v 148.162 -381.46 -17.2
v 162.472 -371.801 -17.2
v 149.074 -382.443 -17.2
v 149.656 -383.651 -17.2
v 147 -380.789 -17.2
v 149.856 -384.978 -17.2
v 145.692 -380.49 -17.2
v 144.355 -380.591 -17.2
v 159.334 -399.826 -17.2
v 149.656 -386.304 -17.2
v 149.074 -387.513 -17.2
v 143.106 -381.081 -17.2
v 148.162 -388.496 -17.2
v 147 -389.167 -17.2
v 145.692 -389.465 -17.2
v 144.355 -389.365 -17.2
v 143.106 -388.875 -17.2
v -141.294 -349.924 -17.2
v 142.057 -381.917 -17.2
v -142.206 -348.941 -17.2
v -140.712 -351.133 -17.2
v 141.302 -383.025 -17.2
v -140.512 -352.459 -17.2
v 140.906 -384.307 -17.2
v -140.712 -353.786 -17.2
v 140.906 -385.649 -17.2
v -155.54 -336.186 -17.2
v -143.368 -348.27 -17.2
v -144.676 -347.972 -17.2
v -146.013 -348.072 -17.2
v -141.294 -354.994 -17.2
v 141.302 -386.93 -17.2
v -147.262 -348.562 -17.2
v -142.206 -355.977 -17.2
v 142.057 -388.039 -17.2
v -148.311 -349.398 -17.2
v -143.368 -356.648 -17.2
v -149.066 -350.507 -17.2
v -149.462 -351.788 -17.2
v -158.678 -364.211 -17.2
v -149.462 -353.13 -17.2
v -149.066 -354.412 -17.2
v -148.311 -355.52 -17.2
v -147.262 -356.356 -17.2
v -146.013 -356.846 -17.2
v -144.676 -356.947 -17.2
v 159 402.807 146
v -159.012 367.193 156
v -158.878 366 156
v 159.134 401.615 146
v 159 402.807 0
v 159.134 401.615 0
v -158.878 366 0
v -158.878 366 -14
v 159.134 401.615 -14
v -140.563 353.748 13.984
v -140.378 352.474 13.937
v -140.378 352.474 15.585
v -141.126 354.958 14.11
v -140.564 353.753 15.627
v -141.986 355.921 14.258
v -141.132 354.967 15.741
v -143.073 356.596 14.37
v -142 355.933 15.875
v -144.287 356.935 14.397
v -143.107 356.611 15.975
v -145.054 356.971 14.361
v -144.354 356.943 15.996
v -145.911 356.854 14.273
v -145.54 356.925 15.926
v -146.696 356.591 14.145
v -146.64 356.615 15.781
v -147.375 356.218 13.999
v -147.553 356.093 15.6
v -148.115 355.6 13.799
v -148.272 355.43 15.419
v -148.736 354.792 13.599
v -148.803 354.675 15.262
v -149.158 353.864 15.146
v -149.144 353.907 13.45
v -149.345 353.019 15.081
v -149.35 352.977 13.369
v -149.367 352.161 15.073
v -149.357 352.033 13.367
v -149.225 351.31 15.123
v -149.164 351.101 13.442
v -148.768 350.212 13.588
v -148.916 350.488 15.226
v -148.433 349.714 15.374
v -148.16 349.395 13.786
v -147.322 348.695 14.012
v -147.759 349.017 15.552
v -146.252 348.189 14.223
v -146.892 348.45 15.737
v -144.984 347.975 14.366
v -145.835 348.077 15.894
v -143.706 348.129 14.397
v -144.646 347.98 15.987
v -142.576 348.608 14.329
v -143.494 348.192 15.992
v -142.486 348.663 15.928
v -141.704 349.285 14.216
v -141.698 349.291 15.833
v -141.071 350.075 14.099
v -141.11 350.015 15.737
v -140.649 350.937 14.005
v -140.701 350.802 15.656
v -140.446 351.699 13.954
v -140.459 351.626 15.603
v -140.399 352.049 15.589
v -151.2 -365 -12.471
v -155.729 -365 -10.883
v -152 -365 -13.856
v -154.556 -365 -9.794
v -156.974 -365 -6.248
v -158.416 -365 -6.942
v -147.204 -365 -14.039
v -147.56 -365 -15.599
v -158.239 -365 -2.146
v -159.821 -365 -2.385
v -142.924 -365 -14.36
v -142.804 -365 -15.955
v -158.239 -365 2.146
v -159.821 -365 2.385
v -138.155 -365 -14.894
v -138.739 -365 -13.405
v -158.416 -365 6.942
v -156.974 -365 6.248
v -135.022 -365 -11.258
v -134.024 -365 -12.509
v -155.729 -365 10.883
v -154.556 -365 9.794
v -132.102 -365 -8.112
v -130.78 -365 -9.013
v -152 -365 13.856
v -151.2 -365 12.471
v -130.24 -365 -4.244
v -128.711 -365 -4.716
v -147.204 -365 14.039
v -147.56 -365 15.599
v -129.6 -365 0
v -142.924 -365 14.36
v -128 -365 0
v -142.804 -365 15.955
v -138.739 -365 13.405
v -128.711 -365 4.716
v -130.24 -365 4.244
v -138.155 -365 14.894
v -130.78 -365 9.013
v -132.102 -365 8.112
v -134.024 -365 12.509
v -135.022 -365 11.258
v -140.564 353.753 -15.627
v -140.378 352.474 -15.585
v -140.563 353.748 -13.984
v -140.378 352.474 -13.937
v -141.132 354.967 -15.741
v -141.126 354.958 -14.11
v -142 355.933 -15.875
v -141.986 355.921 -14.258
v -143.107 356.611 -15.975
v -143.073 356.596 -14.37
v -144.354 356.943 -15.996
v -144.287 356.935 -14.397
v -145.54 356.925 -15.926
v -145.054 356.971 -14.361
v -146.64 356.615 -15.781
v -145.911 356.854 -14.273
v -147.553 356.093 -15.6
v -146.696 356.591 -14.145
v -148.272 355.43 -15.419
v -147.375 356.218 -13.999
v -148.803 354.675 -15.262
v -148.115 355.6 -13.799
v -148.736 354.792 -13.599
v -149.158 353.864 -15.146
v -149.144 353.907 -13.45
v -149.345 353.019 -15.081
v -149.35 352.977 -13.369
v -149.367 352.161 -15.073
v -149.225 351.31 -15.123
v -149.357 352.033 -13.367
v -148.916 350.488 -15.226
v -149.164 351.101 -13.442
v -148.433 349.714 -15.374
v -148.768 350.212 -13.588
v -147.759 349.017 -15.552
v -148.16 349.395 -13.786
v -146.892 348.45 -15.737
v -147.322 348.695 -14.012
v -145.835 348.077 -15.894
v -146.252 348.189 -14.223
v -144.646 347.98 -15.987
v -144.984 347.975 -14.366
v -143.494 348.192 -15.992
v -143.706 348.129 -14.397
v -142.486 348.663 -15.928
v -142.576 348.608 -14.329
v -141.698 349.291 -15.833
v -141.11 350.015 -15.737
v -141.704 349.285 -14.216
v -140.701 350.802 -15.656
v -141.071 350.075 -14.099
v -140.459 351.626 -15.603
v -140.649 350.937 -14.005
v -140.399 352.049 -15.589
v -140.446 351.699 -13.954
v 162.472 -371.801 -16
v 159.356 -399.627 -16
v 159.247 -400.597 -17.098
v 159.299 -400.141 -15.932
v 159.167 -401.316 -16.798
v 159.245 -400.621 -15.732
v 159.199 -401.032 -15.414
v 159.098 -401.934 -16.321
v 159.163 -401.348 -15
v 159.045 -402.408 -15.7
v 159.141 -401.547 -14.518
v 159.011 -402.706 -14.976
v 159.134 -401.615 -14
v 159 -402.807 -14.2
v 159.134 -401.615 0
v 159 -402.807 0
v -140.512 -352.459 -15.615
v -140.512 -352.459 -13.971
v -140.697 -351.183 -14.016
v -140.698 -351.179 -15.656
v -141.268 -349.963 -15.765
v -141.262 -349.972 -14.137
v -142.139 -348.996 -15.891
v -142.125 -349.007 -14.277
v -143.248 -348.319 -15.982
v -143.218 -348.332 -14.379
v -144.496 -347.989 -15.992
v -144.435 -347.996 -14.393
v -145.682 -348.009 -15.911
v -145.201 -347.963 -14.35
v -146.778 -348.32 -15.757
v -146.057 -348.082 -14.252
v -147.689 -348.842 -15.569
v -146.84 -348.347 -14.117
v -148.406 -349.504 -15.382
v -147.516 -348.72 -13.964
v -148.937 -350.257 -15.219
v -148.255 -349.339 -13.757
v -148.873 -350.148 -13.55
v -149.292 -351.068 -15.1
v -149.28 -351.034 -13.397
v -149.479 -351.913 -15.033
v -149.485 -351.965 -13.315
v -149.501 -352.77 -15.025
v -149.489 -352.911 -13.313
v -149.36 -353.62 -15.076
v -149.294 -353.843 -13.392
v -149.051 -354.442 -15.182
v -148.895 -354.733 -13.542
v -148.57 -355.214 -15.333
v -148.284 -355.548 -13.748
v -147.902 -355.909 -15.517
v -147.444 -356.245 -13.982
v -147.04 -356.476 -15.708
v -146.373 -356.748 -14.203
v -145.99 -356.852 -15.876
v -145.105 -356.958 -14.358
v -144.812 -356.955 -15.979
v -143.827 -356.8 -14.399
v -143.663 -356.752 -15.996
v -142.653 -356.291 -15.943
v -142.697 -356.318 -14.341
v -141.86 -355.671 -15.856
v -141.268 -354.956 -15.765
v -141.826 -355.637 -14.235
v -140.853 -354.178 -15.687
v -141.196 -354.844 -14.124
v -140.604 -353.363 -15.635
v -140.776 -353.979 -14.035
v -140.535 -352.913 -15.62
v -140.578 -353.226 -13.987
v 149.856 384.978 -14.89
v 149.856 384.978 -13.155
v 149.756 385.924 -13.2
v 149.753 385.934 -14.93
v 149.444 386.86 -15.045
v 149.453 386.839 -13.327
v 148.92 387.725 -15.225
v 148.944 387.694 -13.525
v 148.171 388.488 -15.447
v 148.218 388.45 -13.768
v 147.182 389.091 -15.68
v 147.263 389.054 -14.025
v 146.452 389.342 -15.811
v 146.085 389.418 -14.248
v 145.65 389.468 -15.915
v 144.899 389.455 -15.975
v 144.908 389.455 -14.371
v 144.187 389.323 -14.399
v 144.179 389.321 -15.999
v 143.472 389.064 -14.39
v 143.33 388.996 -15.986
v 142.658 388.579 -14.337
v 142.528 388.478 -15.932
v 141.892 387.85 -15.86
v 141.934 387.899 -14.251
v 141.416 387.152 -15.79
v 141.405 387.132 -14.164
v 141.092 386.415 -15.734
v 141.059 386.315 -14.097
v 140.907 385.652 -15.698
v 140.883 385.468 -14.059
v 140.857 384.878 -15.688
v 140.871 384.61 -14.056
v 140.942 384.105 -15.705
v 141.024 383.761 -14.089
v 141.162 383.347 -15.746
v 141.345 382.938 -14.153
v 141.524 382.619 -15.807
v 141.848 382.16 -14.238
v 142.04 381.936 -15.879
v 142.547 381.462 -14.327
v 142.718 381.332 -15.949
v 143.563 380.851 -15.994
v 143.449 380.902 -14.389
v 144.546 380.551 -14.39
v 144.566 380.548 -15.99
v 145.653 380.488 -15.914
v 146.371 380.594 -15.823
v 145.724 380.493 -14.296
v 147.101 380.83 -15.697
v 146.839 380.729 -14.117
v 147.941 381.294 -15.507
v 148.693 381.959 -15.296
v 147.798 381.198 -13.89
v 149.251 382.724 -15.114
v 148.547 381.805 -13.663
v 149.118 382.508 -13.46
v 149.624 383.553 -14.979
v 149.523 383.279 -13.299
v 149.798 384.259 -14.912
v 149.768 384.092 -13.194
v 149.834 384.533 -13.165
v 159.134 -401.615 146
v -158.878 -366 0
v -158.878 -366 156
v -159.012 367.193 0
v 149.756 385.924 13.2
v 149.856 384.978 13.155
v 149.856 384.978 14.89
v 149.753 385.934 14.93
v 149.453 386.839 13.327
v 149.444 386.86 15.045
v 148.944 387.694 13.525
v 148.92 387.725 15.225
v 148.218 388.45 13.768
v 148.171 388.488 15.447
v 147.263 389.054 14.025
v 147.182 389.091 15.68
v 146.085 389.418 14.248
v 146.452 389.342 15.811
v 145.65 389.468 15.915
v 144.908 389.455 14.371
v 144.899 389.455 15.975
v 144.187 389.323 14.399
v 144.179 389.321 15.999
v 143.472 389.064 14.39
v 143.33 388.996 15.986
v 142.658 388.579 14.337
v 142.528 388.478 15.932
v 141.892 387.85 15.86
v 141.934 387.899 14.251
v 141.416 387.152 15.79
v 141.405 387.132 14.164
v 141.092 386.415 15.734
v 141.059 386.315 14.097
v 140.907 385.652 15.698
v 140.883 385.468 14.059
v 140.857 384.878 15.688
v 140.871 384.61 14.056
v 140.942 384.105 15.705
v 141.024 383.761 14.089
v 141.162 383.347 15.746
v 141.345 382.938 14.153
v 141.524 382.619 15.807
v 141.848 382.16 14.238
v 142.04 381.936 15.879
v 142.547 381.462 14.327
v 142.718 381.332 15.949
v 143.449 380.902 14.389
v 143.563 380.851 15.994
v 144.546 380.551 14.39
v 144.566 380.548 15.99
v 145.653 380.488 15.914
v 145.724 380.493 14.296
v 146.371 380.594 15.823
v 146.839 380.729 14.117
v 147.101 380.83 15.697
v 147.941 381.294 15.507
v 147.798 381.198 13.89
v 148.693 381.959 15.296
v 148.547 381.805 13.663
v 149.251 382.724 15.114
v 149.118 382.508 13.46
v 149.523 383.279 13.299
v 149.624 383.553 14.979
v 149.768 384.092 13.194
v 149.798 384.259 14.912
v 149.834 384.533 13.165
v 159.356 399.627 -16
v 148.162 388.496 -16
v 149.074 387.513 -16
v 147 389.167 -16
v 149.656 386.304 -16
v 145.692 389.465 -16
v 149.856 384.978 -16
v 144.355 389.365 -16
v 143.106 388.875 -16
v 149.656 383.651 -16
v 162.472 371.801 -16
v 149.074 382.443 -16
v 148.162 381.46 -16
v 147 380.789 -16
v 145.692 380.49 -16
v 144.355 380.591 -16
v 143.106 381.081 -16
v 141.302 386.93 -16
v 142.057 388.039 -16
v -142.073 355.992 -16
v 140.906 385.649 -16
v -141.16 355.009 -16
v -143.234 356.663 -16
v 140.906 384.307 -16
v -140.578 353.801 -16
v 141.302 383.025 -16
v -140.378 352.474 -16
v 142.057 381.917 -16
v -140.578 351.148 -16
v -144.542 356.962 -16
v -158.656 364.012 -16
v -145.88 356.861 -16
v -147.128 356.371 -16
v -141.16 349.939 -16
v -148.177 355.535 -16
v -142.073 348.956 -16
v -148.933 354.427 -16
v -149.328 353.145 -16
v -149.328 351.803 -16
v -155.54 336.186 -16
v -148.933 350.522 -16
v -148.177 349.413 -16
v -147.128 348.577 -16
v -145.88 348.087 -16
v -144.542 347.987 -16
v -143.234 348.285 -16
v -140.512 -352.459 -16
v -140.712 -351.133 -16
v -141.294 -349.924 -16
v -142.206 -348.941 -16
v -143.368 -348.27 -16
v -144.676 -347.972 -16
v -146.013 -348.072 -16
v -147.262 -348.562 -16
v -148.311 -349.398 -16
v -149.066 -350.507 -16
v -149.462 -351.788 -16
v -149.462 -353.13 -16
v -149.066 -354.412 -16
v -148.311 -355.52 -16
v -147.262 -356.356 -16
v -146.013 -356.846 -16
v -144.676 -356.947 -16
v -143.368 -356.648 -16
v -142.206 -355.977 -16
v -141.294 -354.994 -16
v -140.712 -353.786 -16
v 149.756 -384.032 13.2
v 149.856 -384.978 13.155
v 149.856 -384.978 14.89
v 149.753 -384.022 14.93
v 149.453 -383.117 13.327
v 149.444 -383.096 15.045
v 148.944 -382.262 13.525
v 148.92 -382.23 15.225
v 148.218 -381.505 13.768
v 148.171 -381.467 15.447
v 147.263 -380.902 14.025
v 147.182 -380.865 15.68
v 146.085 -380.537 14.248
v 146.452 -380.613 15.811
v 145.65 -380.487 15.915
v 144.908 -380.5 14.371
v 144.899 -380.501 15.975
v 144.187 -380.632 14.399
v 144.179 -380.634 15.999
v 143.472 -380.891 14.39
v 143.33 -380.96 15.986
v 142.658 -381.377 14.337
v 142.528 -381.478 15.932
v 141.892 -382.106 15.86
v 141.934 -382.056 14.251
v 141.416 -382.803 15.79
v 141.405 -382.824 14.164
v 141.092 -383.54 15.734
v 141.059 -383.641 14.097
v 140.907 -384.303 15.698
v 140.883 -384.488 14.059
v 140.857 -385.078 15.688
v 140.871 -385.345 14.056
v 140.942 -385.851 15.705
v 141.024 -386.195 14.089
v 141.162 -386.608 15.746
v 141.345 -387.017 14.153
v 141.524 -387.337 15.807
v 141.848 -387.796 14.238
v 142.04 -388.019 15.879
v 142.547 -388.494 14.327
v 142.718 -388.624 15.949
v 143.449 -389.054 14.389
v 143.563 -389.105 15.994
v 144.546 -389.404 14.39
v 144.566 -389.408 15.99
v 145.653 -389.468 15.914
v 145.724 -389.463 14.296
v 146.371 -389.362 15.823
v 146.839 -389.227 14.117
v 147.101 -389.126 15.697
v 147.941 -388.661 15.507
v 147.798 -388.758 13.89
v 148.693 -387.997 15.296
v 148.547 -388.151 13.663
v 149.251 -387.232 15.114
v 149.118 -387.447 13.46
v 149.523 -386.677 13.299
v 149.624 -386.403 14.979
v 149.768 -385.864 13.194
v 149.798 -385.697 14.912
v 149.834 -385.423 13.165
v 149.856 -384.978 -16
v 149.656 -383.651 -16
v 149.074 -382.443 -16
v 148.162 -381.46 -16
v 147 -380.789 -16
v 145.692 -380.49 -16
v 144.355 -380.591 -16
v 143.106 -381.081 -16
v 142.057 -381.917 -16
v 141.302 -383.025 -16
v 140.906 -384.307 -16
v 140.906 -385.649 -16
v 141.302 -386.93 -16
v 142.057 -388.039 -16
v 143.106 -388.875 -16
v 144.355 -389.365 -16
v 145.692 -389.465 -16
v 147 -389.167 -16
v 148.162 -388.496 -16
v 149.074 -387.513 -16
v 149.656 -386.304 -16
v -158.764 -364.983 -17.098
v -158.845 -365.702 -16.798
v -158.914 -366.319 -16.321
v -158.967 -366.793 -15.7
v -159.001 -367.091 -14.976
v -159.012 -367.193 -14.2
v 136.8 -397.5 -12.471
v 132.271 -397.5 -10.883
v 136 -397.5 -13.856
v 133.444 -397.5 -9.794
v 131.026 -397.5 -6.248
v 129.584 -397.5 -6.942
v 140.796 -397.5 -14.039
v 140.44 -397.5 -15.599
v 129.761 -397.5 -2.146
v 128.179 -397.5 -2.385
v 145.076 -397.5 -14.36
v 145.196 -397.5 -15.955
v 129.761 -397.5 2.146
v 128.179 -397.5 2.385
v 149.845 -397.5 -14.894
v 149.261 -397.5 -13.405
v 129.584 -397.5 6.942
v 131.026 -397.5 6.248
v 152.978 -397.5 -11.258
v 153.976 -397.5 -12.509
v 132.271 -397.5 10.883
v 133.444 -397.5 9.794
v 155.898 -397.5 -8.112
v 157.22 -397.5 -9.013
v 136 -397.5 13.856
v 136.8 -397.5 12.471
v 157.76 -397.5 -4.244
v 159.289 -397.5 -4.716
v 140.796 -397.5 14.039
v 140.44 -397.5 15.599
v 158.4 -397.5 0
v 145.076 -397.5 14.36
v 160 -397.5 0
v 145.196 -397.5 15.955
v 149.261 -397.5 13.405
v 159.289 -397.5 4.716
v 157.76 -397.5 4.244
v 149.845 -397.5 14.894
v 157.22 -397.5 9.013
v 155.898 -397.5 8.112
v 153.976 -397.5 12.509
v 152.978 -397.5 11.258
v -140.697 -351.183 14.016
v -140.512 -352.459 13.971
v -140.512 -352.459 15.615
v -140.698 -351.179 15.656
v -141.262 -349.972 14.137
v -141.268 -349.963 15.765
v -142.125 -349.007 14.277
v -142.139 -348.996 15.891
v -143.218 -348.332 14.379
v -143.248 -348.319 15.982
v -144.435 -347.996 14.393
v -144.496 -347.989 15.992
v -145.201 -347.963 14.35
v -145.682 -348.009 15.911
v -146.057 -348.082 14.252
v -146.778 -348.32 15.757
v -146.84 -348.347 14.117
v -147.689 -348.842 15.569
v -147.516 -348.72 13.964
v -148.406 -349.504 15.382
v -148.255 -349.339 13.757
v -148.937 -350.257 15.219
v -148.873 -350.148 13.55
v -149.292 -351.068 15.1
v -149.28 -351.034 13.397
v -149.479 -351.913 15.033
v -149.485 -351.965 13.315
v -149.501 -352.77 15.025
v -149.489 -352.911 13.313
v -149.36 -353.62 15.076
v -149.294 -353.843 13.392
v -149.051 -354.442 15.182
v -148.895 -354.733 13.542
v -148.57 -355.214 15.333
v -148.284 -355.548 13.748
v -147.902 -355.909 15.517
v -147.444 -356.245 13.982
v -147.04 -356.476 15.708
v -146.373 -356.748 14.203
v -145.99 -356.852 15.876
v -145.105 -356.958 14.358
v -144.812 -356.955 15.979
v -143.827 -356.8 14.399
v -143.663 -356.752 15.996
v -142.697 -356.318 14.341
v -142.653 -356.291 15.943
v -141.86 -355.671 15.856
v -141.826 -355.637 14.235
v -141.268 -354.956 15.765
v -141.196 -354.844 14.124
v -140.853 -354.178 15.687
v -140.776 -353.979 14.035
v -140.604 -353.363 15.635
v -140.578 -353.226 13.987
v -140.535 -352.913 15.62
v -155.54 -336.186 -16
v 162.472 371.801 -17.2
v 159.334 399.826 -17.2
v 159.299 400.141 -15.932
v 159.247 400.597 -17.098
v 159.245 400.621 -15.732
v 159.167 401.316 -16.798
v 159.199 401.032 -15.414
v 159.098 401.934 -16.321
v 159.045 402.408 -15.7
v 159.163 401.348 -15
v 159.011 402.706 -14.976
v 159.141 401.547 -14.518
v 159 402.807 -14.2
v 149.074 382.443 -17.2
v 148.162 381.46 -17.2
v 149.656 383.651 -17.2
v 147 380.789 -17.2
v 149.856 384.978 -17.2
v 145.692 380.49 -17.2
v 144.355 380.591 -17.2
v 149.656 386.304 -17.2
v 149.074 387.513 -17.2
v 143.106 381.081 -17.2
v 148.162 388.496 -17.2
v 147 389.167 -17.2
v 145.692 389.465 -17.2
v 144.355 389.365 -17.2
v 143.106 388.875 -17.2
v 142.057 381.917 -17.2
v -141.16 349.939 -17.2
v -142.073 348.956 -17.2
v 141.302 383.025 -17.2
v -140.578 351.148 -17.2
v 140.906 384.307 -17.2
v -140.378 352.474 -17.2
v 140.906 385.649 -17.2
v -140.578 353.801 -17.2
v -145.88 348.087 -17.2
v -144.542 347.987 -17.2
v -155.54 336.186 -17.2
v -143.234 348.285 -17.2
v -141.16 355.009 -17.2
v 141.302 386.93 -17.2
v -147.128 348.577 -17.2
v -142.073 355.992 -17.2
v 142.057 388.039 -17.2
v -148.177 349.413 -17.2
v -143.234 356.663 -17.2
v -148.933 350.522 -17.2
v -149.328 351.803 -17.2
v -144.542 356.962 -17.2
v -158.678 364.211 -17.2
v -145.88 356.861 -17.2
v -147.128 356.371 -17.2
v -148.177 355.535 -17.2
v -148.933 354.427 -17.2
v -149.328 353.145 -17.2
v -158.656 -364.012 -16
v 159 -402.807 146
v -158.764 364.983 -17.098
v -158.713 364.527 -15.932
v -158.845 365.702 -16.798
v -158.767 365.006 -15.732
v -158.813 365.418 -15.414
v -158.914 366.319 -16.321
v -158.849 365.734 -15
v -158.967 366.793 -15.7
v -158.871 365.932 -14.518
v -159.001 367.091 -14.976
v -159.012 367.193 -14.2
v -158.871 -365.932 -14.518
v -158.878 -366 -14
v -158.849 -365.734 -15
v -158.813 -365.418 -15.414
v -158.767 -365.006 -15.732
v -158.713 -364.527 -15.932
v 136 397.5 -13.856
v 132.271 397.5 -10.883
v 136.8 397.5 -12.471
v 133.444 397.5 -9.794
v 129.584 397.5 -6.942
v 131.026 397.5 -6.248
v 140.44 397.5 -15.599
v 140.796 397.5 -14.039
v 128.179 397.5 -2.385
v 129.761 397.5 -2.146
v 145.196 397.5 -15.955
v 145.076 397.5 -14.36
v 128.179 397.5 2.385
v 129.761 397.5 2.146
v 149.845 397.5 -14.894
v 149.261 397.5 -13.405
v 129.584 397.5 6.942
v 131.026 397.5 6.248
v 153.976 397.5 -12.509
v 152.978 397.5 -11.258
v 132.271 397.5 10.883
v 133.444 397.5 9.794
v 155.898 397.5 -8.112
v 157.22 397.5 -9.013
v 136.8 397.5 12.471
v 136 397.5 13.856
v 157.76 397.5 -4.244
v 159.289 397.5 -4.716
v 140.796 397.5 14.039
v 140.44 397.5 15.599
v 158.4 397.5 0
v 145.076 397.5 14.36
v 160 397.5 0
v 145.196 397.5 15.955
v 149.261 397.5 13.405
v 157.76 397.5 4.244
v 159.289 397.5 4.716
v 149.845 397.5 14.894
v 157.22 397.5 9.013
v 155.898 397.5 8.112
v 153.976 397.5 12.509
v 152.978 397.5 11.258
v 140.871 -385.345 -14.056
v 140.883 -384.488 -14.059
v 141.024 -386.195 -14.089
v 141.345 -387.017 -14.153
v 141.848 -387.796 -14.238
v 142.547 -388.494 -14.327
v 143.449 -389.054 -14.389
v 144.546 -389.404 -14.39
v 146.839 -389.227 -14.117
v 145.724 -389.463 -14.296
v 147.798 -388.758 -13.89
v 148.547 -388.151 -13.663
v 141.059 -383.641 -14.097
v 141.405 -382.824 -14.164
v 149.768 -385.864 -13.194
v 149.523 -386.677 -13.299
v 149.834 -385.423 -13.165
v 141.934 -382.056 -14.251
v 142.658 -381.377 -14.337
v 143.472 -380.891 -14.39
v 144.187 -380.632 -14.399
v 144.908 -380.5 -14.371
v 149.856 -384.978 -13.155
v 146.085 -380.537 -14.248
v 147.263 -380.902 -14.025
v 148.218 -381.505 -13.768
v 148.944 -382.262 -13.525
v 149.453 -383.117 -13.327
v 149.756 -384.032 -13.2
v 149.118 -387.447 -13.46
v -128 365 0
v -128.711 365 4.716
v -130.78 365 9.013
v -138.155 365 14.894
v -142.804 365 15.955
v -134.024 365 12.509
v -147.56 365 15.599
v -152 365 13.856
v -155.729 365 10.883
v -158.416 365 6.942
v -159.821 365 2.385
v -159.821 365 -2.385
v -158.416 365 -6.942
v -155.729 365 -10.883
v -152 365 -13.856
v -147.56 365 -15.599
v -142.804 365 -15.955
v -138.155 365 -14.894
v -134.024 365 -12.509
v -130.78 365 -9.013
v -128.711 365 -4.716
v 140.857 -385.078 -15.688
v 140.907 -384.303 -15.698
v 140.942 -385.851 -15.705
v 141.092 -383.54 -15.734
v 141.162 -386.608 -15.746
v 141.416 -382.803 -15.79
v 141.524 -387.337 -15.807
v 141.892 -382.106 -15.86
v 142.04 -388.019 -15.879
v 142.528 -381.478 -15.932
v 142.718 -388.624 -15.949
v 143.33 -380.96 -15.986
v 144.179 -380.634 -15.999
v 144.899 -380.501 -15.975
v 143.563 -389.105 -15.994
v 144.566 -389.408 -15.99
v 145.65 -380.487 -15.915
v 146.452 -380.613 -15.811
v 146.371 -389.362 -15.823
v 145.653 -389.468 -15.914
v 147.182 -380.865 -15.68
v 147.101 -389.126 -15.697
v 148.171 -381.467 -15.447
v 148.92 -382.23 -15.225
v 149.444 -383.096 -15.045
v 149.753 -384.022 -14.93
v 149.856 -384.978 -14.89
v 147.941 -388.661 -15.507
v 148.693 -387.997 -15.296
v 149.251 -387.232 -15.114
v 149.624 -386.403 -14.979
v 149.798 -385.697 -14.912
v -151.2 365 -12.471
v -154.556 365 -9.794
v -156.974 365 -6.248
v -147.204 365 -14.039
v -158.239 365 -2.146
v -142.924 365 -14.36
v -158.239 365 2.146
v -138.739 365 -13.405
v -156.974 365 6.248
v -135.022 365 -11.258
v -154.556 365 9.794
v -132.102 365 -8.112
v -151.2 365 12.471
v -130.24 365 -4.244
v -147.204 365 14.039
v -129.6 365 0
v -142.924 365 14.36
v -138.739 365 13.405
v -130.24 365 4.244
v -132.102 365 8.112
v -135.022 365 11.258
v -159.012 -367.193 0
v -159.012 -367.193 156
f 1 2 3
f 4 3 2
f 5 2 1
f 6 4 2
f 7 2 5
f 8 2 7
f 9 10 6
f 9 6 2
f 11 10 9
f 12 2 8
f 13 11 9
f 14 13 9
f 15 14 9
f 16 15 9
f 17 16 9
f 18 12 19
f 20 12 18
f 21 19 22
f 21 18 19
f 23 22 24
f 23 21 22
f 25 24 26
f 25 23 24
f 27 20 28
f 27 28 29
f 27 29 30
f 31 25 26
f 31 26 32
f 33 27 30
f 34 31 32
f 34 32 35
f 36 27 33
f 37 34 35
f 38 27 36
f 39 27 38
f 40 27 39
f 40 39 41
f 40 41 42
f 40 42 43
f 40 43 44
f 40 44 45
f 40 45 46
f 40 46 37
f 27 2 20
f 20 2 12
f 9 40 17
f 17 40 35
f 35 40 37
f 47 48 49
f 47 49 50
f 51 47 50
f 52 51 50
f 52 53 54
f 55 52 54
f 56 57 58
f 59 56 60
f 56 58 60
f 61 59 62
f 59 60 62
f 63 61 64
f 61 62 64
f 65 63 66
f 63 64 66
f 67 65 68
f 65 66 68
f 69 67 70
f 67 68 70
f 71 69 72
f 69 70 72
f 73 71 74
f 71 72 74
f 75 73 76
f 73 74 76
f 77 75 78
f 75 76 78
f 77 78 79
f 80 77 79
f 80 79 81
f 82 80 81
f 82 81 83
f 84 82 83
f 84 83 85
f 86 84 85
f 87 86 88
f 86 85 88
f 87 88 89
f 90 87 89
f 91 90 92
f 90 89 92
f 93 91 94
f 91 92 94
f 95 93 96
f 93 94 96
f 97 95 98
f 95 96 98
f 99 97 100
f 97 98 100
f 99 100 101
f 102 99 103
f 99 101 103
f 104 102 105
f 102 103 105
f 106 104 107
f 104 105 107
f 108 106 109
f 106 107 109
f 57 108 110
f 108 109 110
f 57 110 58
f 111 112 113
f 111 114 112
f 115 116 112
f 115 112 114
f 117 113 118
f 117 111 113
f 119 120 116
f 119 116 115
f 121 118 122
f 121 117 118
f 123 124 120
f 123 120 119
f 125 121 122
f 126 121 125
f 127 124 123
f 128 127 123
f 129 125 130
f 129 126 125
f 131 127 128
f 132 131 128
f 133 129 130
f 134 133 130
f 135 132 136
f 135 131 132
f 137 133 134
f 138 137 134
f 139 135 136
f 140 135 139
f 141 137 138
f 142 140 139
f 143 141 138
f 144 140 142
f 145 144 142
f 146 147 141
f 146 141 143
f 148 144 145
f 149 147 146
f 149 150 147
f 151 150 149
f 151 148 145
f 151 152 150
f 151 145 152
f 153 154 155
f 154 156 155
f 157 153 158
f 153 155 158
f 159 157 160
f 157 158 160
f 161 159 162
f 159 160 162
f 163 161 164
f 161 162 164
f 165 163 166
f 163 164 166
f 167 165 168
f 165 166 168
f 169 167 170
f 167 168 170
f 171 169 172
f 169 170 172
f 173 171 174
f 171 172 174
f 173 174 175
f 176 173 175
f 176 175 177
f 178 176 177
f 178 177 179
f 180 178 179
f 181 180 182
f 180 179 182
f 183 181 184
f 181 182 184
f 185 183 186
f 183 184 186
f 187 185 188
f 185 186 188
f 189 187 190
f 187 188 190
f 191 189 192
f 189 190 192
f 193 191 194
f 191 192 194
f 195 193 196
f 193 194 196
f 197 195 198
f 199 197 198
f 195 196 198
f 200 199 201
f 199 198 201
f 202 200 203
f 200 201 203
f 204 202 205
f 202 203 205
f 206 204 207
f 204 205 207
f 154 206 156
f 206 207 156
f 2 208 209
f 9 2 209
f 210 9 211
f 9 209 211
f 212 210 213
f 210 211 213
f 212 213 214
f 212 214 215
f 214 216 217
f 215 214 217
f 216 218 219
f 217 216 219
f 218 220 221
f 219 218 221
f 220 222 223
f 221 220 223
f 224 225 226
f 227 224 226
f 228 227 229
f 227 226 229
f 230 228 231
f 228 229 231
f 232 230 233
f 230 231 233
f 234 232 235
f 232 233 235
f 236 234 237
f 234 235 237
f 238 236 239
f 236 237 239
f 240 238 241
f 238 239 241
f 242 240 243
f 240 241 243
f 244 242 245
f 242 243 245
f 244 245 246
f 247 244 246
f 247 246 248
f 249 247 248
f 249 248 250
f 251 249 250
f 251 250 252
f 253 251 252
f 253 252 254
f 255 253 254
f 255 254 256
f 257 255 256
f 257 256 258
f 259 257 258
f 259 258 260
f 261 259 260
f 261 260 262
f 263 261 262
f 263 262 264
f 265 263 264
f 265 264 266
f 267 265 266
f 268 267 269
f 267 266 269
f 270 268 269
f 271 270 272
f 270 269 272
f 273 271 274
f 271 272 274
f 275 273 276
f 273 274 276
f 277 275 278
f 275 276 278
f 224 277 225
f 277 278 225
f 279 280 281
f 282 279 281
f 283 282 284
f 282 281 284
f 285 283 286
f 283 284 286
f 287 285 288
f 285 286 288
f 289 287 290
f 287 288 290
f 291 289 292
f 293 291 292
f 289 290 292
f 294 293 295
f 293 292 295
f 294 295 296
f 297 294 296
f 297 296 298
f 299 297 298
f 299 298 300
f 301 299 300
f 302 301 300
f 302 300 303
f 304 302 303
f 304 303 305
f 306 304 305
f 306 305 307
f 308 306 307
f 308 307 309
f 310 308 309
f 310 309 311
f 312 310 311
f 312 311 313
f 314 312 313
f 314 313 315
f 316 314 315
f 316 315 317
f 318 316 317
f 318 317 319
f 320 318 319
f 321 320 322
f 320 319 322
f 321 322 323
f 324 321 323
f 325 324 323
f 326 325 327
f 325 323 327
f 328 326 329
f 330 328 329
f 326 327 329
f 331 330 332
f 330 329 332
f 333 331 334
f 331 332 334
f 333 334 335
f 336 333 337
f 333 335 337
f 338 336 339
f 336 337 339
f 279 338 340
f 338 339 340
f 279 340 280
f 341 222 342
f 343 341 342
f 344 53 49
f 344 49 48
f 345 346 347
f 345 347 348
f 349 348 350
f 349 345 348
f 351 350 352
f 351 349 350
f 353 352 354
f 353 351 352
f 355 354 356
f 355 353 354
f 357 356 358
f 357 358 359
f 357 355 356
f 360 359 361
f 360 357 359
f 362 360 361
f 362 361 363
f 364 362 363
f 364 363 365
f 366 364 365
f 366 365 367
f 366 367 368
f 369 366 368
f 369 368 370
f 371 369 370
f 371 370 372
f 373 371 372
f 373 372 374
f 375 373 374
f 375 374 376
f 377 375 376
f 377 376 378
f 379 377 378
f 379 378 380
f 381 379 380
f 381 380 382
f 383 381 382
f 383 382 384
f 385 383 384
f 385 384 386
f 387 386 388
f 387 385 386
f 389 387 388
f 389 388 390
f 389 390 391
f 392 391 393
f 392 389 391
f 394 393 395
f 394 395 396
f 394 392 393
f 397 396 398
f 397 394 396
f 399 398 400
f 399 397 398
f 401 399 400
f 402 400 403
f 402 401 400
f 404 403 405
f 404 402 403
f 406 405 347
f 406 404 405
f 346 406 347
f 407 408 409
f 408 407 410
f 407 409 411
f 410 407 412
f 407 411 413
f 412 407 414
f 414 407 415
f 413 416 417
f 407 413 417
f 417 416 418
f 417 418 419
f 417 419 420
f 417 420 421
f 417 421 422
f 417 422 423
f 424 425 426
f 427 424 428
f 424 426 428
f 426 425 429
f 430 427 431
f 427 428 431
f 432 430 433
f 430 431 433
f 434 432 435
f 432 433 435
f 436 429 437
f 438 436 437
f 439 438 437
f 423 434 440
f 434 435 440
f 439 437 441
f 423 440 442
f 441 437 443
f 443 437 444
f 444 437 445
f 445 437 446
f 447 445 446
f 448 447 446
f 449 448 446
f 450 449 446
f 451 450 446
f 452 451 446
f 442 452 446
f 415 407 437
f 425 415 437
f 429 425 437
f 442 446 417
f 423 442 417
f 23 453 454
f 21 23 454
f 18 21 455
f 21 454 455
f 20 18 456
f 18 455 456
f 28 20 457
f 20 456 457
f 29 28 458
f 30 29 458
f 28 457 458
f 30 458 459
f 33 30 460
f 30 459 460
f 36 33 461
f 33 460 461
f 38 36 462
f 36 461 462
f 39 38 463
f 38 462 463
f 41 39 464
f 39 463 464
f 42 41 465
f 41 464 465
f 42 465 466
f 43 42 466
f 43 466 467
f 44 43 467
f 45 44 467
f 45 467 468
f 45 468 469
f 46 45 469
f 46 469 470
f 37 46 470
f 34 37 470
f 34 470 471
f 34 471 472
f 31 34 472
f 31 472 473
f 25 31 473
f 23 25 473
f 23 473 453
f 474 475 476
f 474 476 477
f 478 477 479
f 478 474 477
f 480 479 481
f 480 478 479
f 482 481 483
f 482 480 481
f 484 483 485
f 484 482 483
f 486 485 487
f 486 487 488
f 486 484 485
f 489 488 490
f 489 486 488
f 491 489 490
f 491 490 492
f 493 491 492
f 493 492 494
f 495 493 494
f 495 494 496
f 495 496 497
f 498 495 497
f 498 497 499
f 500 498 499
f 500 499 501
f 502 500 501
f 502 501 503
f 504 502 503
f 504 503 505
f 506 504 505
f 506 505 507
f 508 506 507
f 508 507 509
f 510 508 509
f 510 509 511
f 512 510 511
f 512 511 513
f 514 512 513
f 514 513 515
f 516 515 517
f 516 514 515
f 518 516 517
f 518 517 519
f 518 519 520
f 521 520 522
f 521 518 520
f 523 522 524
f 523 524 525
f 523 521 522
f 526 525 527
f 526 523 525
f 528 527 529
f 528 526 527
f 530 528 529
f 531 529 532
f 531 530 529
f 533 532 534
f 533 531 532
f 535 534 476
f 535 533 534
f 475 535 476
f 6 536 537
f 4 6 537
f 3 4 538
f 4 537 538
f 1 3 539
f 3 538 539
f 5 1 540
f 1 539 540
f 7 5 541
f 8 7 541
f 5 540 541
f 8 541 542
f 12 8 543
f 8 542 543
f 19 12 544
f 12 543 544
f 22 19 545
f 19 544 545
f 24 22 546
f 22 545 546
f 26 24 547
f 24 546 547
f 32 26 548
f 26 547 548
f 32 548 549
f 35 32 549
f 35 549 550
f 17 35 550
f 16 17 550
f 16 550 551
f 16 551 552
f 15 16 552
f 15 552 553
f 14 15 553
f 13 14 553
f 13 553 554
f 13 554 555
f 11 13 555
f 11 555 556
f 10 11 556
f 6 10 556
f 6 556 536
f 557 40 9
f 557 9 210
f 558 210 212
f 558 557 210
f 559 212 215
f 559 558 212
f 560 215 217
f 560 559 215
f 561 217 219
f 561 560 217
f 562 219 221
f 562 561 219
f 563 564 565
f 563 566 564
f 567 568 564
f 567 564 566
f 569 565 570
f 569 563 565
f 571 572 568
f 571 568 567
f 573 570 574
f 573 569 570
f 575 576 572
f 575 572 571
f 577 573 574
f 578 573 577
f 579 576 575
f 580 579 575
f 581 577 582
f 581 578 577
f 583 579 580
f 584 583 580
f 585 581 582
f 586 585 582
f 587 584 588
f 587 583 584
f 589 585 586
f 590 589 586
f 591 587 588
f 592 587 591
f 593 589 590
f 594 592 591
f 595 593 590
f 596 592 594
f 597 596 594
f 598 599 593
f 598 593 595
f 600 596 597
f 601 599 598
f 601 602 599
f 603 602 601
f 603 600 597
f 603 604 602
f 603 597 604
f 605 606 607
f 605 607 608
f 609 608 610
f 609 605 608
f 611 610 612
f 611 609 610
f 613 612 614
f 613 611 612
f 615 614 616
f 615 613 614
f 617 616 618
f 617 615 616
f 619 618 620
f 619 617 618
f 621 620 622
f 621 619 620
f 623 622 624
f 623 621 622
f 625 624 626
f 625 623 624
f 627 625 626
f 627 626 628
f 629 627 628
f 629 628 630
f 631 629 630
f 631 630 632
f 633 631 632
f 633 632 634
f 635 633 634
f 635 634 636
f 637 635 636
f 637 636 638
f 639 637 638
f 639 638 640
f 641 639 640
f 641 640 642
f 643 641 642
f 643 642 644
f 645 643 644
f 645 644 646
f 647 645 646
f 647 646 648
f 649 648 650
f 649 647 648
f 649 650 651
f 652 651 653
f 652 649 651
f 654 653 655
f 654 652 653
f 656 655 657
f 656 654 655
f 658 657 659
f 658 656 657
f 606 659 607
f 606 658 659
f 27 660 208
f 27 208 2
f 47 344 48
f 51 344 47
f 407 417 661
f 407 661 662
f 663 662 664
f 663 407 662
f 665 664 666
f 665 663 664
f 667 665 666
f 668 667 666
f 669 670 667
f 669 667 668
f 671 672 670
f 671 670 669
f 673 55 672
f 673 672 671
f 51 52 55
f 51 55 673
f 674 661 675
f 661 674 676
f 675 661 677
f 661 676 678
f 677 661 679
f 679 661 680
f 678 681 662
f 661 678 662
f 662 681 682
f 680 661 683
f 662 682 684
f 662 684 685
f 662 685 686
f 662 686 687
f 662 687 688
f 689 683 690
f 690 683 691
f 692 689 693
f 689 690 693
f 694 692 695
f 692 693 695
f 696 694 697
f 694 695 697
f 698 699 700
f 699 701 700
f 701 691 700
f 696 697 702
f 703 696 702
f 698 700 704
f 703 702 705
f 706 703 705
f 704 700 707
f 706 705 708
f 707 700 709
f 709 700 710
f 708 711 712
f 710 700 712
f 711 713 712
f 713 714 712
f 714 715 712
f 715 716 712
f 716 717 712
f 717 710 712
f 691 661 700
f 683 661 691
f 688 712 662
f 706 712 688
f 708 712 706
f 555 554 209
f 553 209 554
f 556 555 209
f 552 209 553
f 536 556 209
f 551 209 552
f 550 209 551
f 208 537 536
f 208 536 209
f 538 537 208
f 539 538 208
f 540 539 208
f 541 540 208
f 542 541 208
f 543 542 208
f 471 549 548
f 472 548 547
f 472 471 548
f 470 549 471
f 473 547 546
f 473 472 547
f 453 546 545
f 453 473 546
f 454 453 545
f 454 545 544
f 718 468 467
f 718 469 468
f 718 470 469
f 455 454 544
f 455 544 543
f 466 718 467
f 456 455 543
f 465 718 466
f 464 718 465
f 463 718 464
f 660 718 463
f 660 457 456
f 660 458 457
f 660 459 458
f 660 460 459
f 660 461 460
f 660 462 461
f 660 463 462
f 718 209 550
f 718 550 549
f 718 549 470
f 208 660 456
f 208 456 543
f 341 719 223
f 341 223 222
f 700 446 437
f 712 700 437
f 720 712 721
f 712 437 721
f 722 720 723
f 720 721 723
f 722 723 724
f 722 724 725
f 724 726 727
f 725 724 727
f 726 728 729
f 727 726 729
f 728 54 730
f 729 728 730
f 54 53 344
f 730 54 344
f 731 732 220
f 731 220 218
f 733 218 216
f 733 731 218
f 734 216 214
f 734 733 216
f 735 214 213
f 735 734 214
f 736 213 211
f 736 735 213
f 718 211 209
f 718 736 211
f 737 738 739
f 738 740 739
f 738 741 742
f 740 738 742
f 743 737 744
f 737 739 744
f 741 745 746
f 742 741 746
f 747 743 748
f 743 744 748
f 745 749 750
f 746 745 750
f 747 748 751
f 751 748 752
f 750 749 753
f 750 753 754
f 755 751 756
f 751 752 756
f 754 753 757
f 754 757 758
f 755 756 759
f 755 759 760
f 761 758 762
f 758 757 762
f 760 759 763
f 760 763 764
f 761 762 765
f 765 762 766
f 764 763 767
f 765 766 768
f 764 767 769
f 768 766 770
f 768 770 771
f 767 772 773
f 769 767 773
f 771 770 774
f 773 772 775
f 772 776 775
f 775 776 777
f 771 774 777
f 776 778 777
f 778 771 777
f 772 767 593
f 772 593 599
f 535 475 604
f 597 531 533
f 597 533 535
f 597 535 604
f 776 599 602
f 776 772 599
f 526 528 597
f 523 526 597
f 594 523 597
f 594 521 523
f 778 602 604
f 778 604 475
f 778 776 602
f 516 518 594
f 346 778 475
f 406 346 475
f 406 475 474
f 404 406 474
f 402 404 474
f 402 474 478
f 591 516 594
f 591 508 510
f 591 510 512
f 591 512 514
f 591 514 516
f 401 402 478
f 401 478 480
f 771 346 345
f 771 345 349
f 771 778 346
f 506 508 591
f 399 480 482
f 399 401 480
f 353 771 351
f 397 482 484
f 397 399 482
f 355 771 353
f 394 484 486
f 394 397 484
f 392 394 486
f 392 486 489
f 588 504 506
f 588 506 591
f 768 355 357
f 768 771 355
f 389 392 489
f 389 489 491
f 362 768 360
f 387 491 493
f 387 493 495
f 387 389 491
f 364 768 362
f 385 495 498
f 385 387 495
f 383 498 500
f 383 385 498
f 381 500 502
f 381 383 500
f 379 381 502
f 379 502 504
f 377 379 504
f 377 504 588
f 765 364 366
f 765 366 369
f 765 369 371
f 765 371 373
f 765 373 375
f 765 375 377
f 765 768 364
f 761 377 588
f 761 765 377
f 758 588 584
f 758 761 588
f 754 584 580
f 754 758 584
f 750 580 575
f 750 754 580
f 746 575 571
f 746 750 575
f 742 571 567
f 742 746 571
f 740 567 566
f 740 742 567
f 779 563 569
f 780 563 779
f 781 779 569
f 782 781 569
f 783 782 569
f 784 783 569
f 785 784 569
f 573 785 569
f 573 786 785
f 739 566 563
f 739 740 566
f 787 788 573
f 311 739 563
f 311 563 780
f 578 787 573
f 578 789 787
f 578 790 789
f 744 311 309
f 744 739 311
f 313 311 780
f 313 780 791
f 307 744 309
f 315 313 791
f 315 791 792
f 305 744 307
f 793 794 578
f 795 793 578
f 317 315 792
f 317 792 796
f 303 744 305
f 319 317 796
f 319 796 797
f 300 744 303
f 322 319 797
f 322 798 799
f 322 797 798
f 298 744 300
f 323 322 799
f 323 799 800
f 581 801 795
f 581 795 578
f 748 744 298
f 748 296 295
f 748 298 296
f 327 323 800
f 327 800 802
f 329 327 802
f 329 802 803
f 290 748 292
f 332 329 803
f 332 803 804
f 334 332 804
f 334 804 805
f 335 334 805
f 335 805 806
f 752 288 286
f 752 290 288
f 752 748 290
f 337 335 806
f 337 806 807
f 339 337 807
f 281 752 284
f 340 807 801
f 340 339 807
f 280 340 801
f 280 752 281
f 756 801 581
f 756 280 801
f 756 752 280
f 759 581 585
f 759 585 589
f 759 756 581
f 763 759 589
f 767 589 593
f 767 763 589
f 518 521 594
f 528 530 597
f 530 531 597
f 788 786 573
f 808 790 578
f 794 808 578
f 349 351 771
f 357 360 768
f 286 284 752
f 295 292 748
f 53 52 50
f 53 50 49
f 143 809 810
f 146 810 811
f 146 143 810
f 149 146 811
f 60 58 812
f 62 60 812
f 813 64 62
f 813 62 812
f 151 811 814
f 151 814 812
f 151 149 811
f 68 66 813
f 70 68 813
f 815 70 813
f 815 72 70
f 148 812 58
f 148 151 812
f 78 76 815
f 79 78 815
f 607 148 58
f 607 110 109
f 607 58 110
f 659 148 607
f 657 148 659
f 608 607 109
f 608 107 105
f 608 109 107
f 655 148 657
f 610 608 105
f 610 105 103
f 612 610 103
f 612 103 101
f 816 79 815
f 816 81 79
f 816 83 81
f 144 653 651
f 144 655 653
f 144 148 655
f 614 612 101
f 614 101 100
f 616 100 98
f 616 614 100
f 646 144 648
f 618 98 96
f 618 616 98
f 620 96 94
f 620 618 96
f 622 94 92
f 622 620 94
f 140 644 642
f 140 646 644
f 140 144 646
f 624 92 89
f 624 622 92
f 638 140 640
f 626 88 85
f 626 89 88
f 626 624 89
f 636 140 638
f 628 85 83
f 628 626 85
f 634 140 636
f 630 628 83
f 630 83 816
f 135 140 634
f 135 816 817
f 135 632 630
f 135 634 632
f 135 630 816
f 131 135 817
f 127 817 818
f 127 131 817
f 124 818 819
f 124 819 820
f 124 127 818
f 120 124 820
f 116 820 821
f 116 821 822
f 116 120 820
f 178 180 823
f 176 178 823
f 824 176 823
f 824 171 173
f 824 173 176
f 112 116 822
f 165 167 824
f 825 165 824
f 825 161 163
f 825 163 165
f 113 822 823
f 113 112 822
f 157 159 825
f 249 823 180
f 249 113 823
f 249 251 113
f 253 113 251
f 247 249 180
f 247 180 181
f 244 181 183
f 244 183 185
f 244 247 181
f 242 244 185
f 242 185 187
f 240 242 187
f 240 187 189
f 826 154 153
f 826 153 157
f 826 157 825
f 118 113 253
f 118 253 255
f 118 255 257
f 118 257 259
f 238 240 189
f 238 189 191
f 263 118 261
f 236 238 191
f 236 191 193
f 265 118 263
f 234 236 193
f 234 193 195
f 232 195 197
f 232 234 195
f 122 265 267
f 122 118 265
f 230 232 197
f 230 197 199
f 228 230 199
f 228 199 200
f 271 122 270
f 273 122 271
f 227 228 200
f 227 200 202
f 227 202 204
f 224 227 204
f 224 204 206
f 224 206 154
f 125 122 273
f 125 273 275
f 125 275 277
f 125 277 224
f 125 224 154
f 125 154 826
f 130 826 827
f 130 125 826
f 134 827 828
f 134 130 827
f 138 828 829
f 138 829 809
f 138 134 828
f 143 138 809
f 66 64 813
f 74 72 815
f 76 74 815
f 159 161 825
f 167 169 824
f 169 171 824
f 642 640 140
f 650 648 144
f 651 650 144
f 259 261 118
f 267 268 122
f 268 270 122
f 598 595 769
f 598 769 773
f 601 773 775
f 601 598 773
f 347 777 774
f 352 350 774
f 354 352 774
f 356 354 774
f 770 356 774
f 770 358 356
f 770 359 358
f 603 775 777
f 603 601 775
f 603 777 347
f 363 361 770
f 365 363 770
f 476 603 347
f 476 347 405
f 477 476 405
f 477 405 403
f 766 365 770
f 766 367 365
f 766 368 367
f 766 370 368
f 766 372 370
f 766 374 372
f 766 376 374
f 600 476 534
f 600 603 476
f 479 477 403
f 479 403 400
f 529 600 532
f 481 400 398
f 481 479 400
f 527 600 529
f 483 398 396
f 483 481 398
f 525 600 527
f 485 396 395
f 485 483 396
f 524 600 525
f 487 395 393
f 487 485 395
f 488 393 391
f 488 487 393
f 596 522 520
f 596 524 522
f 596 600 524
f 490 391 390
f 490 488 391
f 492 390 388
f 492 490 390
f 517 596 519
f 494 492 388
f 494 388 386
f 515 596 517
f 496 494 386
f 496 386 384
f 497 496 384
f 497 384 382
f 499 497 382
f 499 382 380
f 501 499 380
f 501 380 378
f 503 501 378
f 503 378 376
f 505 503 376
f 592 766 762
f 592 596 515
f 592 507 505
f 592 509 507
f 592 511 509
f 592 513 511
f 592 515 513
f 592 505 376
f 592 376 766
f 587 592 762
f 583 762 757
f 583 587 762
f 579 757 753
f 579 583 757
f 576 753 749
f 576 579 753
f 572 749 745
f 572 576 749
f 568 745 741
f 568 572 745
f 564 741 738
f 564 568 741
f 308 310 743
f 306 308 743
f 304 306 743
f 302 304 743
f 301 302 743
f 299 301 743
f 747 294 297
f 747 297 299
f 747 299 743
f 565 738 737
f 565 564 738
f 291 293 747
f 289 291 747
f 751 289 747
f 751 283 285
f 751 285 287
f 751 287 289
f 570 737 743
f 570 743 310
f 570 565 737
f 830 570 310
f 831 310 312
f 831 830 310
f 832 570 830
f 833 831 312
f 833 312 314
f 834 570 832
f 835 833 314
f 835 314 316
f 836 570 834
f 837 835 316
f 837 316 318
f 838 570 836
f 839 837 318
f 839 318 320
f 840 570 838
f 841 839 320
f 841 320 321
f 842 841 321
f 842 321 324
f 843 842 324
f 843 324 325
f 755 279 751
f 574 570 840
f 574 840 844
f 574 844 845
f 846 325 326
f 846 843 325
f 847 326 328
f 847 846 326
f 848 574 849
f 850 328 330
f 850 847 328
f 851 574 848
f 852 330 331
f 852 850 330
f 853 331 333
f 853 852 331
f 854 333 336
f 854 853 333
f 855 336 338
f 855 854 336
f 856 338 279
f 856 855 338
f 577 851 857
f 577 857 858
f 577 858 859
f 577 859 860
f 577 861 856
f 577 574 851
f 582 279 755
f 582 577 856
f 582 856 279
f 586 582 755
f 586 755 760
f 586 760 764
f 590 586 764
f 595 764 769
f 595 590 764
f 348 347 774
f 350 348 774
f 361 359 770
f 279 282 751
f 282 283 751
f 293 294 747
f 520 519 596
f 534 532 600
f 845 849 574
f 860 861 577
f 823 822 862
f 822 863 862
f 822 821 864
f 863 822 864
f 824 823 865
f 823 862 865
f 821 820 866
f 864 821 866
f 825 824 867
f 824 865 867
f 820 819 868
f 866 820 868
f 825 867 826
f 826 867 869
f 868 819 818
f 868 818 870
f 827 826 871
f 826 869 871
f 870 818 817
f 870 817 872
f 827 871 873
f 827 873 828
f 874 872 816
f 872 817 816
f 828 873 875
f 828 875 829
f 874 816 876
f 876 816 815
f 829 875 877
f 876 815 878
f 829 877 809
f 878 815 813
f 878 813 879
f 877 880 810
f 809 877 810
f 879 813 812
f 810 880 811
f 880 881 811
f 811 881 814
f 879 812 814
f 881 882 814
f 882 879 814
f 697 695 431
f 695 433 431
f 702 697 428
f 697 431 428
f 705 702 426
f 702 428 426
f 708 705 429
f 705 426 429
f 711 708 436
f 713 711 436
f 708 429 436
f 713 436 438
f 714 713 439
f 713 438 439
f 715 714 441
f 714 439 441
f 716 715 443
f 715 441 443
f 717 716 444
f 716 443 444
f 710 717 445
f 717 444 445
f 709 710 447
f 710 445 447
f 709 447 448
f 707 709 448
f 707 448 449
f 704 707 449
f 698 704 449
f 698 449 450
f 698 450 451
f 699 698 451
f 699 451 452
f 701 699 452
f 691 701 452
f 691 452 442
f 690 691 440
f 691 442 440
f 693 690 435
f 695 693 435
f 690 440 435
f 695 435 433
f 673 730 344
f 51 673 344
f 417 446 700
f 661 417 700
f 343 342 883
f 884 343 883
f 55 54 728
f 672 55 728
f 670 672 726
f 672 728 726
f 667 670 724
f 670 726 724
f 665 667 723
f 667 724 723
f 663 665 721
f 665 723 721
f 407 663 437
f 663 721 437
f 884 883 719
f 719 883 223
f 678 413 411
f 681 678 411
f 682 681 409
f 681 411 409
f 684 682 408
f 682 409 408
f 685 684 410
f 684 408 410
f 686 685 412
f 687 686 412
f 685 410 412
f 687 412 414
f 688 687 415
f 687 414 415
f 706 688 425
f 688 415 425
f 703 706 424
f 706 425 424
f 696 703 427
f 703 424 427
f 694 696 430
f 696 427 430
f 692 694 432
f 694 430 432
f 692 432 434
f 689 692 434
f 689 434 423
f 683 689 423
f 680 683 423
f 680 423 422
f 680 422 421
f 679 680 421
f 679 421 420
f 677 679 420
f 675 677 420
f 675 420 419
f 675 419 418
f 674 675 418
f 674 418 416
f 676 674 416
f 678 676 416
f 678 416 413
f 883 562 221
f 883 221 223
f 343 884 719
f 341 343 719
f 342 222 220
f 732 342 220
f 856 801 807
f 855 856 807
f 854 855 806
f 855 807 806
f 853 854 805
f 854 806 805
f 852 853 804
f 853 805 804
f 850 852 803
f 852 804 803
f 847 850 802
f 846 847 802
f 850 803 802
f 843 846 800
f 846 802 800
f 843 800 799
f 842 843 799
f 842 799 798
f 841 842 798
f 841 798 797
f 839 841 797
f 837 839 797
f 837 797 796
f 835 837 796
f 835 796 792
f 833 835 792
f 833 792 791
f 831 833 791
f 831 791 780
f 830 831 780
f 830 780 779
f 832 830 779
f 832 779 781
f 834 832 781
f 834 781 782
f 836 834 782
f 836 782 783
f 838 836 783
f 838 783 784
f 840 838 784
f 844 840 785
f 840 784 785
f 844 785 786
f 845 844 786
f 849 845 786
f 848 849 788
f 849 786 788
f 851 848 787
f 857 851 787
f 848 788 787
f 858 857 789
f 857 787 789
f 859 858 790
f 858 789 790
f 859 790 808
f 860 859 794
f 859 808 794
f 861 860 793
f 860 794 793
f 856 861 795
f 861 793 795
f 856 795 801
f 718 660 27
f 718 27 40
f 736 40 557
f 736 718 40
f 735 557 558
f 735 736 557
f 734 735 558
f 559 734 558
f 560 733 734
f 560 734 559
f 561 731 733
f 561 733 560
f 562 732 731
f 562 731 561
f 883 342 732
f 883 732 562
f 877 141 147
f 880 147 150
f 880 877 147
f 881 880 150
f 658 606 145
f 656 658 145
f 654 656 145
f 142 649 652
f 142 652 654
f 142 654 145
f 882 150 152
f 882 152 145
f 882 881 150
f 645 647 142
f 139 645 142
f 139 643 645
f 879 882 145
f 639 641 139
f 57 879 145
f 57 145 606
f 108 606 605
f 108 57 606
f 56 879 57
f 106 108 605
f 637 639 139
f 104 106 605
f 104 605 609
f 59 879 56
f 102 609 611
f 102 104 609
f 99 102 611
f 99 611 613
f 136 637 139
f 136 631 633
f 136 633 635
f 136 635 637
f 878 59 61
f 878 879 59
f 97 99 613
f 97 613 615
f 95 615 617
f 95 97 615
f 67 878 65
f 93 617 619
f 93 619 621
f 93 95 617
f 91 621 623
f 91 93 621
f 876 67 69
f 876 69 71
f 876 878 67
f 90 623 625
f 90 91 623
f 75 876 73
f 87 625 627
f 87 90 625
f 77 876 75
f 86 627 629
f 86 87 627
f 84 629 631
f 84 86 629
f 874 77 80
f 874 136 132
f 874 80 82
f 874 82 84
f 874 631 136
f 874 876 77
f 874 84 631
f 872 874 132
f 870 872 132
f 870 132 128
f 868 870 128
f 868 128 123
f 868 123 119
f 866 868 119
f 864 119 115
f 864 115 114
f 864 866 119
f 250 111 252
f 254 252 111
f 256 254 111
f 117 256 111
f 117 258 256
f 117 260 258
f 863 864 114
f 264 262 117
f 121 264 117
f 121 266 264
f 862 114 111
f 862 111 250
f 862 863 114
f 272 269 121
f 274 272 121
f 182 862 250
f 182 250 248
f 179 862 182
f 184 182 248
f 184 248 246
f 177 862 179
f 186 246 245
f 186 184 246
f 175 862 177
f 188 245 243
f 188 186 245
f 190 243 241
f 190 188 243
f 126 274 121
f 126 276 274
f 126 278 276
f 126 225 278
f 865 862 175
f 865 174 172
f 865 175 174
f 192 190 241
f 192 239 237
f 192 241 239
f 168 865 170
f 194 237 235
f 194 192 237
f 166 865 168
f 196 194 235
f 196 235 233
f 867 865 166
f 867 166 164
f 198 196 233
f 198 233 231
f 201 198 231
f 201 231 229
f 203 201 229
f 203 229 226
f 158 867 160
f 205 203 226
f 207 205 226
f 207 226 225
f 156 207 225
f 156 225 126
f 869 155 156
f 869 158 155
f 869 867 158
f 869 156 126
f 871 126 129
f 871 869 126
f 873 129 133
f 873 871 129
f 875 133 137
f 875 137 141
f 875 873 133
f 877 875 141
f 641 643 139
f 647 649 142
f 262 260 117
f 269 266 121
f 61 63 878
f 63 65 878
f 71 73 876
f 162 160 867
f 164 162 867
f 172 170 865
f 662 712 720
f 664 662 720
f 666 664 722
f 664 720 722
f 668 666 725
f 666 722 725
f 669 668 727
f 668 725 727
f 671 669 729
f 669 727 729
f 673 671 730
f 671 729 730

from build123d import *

# Parameters (mm, degrees)
F0_R      = 16
F0_R_2    = 14.4
F1_DEPTH  = 365
F2_R      = 16
F2_R_2    = 14.4
F3_DEPTH  = 397.5
F5_DEPTH  = 156
F7_DEPTH  = 320
F9_DEPTH  = 1.2
F11_R     = 4.5
F12_DEPTH = 18


with BuildPart() as f1:
    # F0 (on Front) → F1 (new body, symmetric)
    with BuildSketch(Plane.XZ):
        with Locations((-144, 0)):
            Circle(F0_R)
        with Locations((-144, 0)):
            Circle(F0_R_2, mode=Mode.SUBTRACT)
    extrude(amount=F1_DEPTH, both=True)


with BuildPart() as f3:
    # F2 (on Front) → F3 (new body, symmetric)
    with BuildSketch(Plane.XZ):
        with Locations((144, 0)):
            Circle(F2_R)
        with Locations((144, 0)):
            Circle(F2_R_2, mode=Mode.SUBTRACT)
    extrude(amount=F3_DEPTH, both=True)


with BuildPart() as f5:
    # F4 (on Top) → F5 (new body)
    with BuildSketch(Plane.XY):
        Polygon((159.1335545823, -401.614555292), (-158.8784003051, -366), (-159.0119548875, -367.1925448308), (159, -402.8071001228), align=None)
    extrude(amount=F5_DEPTH)

    # F6 (on face) → F7 (join)
    with BuildSketch(Plane(origin=(-116.4293426194, 13.0390672319, 0), x_dir=(-0.1112954853, -0.993787359, 0), z_dir=(-0.993787359, 0.1112954853, 0))):
        with BuildLine():
            Line((382.6086220662, 0), (381.4086220662, 0))
            Line((381.4086220662, 0), (381.4086220662, -14))
            ThreePointArc((381.4086220662, -14), (380.8228356286, -15.4142135624), (379.4086220662, -16))
            Line((379.4086220662, -16), (351.4086220662, -16))
            Line((351.4086220662, -16), (351.4086220662, -17.2))
            Line((351.4086220662, -17.2), (379.6086220662, -17.2))
            ThreePointArc((379.6086220662, -17.2), (381.7299424098, -16.3213203436), (382.6086220662, -14.2))
            Line((382.6086220662, -14.2), (382.6086220662, 0))
        make_face()
    extrude(amount=-F7_DEPTH)

    # F8 (on face) → F9 (cut, through all)
    with BuildSketch(Plane(origin=(-42.5826122681, -380.2316120627, 0), x_dir=(0.993787359, -0.1112954853, 0), z_dir=(-0.1112954853, -0.993787359, 0))):
        Polygon((202.8428017702, 156), (-117.1571982298, 156), (202.8428017702, 146), align=None)
    extrude(amount=-F9_DEPTH, mode=Mode.SUBTRACT)


with BuildPart() as f10_1:
    # F10: instance of F5
    add(f5.part.mirror(Plane.XZ))


with BuildPart() as f12_tool:
    # F11 (on Top) → F12 (new body, symmetric)
    with BuildSketch(Plane.XY):
        with Locations((-145.0119548875, -352.459148322)):
            Circle(F11_R)
        with Locations((145.3561455529, -384.977833891)):
            Circle(F11_R)
        with Locations((145.3561455529, 384.977833891)):
            Circle(F11_R)
        with Locations((-144.8784003051, 352.4741052662)):
            Circle(F11_R)
    extrude(amount=F12_DEPTH, both=True)


with BuildPart() as f1_1:
    add(f1.part)

    # F12: cut by f12_tool
    add(f12_tool.part, mode=Mode.SUBTRACT)


with BuildPart() as f3_1:
    add(f3.part)

    # F12: cut by f12_tool
    add(f12_tool.part, mode=Mode.SUBTRACT)


with BuildPart() as f5_1:
    add(f5.part)

    # F12: cut by f12_tool
    add(f12_tool.part, mode=Mode.SUBTRACT)


with BuildPart() as f10_1_1:
    add(f10_1.part)

    # F12: cut by f12_tool
    add(f12_tool.part, mode=Mode.SUBTRACT)


solid = Compound([f1_1.part, f3_1.part, f5_1.part, f10_1_1.part])
